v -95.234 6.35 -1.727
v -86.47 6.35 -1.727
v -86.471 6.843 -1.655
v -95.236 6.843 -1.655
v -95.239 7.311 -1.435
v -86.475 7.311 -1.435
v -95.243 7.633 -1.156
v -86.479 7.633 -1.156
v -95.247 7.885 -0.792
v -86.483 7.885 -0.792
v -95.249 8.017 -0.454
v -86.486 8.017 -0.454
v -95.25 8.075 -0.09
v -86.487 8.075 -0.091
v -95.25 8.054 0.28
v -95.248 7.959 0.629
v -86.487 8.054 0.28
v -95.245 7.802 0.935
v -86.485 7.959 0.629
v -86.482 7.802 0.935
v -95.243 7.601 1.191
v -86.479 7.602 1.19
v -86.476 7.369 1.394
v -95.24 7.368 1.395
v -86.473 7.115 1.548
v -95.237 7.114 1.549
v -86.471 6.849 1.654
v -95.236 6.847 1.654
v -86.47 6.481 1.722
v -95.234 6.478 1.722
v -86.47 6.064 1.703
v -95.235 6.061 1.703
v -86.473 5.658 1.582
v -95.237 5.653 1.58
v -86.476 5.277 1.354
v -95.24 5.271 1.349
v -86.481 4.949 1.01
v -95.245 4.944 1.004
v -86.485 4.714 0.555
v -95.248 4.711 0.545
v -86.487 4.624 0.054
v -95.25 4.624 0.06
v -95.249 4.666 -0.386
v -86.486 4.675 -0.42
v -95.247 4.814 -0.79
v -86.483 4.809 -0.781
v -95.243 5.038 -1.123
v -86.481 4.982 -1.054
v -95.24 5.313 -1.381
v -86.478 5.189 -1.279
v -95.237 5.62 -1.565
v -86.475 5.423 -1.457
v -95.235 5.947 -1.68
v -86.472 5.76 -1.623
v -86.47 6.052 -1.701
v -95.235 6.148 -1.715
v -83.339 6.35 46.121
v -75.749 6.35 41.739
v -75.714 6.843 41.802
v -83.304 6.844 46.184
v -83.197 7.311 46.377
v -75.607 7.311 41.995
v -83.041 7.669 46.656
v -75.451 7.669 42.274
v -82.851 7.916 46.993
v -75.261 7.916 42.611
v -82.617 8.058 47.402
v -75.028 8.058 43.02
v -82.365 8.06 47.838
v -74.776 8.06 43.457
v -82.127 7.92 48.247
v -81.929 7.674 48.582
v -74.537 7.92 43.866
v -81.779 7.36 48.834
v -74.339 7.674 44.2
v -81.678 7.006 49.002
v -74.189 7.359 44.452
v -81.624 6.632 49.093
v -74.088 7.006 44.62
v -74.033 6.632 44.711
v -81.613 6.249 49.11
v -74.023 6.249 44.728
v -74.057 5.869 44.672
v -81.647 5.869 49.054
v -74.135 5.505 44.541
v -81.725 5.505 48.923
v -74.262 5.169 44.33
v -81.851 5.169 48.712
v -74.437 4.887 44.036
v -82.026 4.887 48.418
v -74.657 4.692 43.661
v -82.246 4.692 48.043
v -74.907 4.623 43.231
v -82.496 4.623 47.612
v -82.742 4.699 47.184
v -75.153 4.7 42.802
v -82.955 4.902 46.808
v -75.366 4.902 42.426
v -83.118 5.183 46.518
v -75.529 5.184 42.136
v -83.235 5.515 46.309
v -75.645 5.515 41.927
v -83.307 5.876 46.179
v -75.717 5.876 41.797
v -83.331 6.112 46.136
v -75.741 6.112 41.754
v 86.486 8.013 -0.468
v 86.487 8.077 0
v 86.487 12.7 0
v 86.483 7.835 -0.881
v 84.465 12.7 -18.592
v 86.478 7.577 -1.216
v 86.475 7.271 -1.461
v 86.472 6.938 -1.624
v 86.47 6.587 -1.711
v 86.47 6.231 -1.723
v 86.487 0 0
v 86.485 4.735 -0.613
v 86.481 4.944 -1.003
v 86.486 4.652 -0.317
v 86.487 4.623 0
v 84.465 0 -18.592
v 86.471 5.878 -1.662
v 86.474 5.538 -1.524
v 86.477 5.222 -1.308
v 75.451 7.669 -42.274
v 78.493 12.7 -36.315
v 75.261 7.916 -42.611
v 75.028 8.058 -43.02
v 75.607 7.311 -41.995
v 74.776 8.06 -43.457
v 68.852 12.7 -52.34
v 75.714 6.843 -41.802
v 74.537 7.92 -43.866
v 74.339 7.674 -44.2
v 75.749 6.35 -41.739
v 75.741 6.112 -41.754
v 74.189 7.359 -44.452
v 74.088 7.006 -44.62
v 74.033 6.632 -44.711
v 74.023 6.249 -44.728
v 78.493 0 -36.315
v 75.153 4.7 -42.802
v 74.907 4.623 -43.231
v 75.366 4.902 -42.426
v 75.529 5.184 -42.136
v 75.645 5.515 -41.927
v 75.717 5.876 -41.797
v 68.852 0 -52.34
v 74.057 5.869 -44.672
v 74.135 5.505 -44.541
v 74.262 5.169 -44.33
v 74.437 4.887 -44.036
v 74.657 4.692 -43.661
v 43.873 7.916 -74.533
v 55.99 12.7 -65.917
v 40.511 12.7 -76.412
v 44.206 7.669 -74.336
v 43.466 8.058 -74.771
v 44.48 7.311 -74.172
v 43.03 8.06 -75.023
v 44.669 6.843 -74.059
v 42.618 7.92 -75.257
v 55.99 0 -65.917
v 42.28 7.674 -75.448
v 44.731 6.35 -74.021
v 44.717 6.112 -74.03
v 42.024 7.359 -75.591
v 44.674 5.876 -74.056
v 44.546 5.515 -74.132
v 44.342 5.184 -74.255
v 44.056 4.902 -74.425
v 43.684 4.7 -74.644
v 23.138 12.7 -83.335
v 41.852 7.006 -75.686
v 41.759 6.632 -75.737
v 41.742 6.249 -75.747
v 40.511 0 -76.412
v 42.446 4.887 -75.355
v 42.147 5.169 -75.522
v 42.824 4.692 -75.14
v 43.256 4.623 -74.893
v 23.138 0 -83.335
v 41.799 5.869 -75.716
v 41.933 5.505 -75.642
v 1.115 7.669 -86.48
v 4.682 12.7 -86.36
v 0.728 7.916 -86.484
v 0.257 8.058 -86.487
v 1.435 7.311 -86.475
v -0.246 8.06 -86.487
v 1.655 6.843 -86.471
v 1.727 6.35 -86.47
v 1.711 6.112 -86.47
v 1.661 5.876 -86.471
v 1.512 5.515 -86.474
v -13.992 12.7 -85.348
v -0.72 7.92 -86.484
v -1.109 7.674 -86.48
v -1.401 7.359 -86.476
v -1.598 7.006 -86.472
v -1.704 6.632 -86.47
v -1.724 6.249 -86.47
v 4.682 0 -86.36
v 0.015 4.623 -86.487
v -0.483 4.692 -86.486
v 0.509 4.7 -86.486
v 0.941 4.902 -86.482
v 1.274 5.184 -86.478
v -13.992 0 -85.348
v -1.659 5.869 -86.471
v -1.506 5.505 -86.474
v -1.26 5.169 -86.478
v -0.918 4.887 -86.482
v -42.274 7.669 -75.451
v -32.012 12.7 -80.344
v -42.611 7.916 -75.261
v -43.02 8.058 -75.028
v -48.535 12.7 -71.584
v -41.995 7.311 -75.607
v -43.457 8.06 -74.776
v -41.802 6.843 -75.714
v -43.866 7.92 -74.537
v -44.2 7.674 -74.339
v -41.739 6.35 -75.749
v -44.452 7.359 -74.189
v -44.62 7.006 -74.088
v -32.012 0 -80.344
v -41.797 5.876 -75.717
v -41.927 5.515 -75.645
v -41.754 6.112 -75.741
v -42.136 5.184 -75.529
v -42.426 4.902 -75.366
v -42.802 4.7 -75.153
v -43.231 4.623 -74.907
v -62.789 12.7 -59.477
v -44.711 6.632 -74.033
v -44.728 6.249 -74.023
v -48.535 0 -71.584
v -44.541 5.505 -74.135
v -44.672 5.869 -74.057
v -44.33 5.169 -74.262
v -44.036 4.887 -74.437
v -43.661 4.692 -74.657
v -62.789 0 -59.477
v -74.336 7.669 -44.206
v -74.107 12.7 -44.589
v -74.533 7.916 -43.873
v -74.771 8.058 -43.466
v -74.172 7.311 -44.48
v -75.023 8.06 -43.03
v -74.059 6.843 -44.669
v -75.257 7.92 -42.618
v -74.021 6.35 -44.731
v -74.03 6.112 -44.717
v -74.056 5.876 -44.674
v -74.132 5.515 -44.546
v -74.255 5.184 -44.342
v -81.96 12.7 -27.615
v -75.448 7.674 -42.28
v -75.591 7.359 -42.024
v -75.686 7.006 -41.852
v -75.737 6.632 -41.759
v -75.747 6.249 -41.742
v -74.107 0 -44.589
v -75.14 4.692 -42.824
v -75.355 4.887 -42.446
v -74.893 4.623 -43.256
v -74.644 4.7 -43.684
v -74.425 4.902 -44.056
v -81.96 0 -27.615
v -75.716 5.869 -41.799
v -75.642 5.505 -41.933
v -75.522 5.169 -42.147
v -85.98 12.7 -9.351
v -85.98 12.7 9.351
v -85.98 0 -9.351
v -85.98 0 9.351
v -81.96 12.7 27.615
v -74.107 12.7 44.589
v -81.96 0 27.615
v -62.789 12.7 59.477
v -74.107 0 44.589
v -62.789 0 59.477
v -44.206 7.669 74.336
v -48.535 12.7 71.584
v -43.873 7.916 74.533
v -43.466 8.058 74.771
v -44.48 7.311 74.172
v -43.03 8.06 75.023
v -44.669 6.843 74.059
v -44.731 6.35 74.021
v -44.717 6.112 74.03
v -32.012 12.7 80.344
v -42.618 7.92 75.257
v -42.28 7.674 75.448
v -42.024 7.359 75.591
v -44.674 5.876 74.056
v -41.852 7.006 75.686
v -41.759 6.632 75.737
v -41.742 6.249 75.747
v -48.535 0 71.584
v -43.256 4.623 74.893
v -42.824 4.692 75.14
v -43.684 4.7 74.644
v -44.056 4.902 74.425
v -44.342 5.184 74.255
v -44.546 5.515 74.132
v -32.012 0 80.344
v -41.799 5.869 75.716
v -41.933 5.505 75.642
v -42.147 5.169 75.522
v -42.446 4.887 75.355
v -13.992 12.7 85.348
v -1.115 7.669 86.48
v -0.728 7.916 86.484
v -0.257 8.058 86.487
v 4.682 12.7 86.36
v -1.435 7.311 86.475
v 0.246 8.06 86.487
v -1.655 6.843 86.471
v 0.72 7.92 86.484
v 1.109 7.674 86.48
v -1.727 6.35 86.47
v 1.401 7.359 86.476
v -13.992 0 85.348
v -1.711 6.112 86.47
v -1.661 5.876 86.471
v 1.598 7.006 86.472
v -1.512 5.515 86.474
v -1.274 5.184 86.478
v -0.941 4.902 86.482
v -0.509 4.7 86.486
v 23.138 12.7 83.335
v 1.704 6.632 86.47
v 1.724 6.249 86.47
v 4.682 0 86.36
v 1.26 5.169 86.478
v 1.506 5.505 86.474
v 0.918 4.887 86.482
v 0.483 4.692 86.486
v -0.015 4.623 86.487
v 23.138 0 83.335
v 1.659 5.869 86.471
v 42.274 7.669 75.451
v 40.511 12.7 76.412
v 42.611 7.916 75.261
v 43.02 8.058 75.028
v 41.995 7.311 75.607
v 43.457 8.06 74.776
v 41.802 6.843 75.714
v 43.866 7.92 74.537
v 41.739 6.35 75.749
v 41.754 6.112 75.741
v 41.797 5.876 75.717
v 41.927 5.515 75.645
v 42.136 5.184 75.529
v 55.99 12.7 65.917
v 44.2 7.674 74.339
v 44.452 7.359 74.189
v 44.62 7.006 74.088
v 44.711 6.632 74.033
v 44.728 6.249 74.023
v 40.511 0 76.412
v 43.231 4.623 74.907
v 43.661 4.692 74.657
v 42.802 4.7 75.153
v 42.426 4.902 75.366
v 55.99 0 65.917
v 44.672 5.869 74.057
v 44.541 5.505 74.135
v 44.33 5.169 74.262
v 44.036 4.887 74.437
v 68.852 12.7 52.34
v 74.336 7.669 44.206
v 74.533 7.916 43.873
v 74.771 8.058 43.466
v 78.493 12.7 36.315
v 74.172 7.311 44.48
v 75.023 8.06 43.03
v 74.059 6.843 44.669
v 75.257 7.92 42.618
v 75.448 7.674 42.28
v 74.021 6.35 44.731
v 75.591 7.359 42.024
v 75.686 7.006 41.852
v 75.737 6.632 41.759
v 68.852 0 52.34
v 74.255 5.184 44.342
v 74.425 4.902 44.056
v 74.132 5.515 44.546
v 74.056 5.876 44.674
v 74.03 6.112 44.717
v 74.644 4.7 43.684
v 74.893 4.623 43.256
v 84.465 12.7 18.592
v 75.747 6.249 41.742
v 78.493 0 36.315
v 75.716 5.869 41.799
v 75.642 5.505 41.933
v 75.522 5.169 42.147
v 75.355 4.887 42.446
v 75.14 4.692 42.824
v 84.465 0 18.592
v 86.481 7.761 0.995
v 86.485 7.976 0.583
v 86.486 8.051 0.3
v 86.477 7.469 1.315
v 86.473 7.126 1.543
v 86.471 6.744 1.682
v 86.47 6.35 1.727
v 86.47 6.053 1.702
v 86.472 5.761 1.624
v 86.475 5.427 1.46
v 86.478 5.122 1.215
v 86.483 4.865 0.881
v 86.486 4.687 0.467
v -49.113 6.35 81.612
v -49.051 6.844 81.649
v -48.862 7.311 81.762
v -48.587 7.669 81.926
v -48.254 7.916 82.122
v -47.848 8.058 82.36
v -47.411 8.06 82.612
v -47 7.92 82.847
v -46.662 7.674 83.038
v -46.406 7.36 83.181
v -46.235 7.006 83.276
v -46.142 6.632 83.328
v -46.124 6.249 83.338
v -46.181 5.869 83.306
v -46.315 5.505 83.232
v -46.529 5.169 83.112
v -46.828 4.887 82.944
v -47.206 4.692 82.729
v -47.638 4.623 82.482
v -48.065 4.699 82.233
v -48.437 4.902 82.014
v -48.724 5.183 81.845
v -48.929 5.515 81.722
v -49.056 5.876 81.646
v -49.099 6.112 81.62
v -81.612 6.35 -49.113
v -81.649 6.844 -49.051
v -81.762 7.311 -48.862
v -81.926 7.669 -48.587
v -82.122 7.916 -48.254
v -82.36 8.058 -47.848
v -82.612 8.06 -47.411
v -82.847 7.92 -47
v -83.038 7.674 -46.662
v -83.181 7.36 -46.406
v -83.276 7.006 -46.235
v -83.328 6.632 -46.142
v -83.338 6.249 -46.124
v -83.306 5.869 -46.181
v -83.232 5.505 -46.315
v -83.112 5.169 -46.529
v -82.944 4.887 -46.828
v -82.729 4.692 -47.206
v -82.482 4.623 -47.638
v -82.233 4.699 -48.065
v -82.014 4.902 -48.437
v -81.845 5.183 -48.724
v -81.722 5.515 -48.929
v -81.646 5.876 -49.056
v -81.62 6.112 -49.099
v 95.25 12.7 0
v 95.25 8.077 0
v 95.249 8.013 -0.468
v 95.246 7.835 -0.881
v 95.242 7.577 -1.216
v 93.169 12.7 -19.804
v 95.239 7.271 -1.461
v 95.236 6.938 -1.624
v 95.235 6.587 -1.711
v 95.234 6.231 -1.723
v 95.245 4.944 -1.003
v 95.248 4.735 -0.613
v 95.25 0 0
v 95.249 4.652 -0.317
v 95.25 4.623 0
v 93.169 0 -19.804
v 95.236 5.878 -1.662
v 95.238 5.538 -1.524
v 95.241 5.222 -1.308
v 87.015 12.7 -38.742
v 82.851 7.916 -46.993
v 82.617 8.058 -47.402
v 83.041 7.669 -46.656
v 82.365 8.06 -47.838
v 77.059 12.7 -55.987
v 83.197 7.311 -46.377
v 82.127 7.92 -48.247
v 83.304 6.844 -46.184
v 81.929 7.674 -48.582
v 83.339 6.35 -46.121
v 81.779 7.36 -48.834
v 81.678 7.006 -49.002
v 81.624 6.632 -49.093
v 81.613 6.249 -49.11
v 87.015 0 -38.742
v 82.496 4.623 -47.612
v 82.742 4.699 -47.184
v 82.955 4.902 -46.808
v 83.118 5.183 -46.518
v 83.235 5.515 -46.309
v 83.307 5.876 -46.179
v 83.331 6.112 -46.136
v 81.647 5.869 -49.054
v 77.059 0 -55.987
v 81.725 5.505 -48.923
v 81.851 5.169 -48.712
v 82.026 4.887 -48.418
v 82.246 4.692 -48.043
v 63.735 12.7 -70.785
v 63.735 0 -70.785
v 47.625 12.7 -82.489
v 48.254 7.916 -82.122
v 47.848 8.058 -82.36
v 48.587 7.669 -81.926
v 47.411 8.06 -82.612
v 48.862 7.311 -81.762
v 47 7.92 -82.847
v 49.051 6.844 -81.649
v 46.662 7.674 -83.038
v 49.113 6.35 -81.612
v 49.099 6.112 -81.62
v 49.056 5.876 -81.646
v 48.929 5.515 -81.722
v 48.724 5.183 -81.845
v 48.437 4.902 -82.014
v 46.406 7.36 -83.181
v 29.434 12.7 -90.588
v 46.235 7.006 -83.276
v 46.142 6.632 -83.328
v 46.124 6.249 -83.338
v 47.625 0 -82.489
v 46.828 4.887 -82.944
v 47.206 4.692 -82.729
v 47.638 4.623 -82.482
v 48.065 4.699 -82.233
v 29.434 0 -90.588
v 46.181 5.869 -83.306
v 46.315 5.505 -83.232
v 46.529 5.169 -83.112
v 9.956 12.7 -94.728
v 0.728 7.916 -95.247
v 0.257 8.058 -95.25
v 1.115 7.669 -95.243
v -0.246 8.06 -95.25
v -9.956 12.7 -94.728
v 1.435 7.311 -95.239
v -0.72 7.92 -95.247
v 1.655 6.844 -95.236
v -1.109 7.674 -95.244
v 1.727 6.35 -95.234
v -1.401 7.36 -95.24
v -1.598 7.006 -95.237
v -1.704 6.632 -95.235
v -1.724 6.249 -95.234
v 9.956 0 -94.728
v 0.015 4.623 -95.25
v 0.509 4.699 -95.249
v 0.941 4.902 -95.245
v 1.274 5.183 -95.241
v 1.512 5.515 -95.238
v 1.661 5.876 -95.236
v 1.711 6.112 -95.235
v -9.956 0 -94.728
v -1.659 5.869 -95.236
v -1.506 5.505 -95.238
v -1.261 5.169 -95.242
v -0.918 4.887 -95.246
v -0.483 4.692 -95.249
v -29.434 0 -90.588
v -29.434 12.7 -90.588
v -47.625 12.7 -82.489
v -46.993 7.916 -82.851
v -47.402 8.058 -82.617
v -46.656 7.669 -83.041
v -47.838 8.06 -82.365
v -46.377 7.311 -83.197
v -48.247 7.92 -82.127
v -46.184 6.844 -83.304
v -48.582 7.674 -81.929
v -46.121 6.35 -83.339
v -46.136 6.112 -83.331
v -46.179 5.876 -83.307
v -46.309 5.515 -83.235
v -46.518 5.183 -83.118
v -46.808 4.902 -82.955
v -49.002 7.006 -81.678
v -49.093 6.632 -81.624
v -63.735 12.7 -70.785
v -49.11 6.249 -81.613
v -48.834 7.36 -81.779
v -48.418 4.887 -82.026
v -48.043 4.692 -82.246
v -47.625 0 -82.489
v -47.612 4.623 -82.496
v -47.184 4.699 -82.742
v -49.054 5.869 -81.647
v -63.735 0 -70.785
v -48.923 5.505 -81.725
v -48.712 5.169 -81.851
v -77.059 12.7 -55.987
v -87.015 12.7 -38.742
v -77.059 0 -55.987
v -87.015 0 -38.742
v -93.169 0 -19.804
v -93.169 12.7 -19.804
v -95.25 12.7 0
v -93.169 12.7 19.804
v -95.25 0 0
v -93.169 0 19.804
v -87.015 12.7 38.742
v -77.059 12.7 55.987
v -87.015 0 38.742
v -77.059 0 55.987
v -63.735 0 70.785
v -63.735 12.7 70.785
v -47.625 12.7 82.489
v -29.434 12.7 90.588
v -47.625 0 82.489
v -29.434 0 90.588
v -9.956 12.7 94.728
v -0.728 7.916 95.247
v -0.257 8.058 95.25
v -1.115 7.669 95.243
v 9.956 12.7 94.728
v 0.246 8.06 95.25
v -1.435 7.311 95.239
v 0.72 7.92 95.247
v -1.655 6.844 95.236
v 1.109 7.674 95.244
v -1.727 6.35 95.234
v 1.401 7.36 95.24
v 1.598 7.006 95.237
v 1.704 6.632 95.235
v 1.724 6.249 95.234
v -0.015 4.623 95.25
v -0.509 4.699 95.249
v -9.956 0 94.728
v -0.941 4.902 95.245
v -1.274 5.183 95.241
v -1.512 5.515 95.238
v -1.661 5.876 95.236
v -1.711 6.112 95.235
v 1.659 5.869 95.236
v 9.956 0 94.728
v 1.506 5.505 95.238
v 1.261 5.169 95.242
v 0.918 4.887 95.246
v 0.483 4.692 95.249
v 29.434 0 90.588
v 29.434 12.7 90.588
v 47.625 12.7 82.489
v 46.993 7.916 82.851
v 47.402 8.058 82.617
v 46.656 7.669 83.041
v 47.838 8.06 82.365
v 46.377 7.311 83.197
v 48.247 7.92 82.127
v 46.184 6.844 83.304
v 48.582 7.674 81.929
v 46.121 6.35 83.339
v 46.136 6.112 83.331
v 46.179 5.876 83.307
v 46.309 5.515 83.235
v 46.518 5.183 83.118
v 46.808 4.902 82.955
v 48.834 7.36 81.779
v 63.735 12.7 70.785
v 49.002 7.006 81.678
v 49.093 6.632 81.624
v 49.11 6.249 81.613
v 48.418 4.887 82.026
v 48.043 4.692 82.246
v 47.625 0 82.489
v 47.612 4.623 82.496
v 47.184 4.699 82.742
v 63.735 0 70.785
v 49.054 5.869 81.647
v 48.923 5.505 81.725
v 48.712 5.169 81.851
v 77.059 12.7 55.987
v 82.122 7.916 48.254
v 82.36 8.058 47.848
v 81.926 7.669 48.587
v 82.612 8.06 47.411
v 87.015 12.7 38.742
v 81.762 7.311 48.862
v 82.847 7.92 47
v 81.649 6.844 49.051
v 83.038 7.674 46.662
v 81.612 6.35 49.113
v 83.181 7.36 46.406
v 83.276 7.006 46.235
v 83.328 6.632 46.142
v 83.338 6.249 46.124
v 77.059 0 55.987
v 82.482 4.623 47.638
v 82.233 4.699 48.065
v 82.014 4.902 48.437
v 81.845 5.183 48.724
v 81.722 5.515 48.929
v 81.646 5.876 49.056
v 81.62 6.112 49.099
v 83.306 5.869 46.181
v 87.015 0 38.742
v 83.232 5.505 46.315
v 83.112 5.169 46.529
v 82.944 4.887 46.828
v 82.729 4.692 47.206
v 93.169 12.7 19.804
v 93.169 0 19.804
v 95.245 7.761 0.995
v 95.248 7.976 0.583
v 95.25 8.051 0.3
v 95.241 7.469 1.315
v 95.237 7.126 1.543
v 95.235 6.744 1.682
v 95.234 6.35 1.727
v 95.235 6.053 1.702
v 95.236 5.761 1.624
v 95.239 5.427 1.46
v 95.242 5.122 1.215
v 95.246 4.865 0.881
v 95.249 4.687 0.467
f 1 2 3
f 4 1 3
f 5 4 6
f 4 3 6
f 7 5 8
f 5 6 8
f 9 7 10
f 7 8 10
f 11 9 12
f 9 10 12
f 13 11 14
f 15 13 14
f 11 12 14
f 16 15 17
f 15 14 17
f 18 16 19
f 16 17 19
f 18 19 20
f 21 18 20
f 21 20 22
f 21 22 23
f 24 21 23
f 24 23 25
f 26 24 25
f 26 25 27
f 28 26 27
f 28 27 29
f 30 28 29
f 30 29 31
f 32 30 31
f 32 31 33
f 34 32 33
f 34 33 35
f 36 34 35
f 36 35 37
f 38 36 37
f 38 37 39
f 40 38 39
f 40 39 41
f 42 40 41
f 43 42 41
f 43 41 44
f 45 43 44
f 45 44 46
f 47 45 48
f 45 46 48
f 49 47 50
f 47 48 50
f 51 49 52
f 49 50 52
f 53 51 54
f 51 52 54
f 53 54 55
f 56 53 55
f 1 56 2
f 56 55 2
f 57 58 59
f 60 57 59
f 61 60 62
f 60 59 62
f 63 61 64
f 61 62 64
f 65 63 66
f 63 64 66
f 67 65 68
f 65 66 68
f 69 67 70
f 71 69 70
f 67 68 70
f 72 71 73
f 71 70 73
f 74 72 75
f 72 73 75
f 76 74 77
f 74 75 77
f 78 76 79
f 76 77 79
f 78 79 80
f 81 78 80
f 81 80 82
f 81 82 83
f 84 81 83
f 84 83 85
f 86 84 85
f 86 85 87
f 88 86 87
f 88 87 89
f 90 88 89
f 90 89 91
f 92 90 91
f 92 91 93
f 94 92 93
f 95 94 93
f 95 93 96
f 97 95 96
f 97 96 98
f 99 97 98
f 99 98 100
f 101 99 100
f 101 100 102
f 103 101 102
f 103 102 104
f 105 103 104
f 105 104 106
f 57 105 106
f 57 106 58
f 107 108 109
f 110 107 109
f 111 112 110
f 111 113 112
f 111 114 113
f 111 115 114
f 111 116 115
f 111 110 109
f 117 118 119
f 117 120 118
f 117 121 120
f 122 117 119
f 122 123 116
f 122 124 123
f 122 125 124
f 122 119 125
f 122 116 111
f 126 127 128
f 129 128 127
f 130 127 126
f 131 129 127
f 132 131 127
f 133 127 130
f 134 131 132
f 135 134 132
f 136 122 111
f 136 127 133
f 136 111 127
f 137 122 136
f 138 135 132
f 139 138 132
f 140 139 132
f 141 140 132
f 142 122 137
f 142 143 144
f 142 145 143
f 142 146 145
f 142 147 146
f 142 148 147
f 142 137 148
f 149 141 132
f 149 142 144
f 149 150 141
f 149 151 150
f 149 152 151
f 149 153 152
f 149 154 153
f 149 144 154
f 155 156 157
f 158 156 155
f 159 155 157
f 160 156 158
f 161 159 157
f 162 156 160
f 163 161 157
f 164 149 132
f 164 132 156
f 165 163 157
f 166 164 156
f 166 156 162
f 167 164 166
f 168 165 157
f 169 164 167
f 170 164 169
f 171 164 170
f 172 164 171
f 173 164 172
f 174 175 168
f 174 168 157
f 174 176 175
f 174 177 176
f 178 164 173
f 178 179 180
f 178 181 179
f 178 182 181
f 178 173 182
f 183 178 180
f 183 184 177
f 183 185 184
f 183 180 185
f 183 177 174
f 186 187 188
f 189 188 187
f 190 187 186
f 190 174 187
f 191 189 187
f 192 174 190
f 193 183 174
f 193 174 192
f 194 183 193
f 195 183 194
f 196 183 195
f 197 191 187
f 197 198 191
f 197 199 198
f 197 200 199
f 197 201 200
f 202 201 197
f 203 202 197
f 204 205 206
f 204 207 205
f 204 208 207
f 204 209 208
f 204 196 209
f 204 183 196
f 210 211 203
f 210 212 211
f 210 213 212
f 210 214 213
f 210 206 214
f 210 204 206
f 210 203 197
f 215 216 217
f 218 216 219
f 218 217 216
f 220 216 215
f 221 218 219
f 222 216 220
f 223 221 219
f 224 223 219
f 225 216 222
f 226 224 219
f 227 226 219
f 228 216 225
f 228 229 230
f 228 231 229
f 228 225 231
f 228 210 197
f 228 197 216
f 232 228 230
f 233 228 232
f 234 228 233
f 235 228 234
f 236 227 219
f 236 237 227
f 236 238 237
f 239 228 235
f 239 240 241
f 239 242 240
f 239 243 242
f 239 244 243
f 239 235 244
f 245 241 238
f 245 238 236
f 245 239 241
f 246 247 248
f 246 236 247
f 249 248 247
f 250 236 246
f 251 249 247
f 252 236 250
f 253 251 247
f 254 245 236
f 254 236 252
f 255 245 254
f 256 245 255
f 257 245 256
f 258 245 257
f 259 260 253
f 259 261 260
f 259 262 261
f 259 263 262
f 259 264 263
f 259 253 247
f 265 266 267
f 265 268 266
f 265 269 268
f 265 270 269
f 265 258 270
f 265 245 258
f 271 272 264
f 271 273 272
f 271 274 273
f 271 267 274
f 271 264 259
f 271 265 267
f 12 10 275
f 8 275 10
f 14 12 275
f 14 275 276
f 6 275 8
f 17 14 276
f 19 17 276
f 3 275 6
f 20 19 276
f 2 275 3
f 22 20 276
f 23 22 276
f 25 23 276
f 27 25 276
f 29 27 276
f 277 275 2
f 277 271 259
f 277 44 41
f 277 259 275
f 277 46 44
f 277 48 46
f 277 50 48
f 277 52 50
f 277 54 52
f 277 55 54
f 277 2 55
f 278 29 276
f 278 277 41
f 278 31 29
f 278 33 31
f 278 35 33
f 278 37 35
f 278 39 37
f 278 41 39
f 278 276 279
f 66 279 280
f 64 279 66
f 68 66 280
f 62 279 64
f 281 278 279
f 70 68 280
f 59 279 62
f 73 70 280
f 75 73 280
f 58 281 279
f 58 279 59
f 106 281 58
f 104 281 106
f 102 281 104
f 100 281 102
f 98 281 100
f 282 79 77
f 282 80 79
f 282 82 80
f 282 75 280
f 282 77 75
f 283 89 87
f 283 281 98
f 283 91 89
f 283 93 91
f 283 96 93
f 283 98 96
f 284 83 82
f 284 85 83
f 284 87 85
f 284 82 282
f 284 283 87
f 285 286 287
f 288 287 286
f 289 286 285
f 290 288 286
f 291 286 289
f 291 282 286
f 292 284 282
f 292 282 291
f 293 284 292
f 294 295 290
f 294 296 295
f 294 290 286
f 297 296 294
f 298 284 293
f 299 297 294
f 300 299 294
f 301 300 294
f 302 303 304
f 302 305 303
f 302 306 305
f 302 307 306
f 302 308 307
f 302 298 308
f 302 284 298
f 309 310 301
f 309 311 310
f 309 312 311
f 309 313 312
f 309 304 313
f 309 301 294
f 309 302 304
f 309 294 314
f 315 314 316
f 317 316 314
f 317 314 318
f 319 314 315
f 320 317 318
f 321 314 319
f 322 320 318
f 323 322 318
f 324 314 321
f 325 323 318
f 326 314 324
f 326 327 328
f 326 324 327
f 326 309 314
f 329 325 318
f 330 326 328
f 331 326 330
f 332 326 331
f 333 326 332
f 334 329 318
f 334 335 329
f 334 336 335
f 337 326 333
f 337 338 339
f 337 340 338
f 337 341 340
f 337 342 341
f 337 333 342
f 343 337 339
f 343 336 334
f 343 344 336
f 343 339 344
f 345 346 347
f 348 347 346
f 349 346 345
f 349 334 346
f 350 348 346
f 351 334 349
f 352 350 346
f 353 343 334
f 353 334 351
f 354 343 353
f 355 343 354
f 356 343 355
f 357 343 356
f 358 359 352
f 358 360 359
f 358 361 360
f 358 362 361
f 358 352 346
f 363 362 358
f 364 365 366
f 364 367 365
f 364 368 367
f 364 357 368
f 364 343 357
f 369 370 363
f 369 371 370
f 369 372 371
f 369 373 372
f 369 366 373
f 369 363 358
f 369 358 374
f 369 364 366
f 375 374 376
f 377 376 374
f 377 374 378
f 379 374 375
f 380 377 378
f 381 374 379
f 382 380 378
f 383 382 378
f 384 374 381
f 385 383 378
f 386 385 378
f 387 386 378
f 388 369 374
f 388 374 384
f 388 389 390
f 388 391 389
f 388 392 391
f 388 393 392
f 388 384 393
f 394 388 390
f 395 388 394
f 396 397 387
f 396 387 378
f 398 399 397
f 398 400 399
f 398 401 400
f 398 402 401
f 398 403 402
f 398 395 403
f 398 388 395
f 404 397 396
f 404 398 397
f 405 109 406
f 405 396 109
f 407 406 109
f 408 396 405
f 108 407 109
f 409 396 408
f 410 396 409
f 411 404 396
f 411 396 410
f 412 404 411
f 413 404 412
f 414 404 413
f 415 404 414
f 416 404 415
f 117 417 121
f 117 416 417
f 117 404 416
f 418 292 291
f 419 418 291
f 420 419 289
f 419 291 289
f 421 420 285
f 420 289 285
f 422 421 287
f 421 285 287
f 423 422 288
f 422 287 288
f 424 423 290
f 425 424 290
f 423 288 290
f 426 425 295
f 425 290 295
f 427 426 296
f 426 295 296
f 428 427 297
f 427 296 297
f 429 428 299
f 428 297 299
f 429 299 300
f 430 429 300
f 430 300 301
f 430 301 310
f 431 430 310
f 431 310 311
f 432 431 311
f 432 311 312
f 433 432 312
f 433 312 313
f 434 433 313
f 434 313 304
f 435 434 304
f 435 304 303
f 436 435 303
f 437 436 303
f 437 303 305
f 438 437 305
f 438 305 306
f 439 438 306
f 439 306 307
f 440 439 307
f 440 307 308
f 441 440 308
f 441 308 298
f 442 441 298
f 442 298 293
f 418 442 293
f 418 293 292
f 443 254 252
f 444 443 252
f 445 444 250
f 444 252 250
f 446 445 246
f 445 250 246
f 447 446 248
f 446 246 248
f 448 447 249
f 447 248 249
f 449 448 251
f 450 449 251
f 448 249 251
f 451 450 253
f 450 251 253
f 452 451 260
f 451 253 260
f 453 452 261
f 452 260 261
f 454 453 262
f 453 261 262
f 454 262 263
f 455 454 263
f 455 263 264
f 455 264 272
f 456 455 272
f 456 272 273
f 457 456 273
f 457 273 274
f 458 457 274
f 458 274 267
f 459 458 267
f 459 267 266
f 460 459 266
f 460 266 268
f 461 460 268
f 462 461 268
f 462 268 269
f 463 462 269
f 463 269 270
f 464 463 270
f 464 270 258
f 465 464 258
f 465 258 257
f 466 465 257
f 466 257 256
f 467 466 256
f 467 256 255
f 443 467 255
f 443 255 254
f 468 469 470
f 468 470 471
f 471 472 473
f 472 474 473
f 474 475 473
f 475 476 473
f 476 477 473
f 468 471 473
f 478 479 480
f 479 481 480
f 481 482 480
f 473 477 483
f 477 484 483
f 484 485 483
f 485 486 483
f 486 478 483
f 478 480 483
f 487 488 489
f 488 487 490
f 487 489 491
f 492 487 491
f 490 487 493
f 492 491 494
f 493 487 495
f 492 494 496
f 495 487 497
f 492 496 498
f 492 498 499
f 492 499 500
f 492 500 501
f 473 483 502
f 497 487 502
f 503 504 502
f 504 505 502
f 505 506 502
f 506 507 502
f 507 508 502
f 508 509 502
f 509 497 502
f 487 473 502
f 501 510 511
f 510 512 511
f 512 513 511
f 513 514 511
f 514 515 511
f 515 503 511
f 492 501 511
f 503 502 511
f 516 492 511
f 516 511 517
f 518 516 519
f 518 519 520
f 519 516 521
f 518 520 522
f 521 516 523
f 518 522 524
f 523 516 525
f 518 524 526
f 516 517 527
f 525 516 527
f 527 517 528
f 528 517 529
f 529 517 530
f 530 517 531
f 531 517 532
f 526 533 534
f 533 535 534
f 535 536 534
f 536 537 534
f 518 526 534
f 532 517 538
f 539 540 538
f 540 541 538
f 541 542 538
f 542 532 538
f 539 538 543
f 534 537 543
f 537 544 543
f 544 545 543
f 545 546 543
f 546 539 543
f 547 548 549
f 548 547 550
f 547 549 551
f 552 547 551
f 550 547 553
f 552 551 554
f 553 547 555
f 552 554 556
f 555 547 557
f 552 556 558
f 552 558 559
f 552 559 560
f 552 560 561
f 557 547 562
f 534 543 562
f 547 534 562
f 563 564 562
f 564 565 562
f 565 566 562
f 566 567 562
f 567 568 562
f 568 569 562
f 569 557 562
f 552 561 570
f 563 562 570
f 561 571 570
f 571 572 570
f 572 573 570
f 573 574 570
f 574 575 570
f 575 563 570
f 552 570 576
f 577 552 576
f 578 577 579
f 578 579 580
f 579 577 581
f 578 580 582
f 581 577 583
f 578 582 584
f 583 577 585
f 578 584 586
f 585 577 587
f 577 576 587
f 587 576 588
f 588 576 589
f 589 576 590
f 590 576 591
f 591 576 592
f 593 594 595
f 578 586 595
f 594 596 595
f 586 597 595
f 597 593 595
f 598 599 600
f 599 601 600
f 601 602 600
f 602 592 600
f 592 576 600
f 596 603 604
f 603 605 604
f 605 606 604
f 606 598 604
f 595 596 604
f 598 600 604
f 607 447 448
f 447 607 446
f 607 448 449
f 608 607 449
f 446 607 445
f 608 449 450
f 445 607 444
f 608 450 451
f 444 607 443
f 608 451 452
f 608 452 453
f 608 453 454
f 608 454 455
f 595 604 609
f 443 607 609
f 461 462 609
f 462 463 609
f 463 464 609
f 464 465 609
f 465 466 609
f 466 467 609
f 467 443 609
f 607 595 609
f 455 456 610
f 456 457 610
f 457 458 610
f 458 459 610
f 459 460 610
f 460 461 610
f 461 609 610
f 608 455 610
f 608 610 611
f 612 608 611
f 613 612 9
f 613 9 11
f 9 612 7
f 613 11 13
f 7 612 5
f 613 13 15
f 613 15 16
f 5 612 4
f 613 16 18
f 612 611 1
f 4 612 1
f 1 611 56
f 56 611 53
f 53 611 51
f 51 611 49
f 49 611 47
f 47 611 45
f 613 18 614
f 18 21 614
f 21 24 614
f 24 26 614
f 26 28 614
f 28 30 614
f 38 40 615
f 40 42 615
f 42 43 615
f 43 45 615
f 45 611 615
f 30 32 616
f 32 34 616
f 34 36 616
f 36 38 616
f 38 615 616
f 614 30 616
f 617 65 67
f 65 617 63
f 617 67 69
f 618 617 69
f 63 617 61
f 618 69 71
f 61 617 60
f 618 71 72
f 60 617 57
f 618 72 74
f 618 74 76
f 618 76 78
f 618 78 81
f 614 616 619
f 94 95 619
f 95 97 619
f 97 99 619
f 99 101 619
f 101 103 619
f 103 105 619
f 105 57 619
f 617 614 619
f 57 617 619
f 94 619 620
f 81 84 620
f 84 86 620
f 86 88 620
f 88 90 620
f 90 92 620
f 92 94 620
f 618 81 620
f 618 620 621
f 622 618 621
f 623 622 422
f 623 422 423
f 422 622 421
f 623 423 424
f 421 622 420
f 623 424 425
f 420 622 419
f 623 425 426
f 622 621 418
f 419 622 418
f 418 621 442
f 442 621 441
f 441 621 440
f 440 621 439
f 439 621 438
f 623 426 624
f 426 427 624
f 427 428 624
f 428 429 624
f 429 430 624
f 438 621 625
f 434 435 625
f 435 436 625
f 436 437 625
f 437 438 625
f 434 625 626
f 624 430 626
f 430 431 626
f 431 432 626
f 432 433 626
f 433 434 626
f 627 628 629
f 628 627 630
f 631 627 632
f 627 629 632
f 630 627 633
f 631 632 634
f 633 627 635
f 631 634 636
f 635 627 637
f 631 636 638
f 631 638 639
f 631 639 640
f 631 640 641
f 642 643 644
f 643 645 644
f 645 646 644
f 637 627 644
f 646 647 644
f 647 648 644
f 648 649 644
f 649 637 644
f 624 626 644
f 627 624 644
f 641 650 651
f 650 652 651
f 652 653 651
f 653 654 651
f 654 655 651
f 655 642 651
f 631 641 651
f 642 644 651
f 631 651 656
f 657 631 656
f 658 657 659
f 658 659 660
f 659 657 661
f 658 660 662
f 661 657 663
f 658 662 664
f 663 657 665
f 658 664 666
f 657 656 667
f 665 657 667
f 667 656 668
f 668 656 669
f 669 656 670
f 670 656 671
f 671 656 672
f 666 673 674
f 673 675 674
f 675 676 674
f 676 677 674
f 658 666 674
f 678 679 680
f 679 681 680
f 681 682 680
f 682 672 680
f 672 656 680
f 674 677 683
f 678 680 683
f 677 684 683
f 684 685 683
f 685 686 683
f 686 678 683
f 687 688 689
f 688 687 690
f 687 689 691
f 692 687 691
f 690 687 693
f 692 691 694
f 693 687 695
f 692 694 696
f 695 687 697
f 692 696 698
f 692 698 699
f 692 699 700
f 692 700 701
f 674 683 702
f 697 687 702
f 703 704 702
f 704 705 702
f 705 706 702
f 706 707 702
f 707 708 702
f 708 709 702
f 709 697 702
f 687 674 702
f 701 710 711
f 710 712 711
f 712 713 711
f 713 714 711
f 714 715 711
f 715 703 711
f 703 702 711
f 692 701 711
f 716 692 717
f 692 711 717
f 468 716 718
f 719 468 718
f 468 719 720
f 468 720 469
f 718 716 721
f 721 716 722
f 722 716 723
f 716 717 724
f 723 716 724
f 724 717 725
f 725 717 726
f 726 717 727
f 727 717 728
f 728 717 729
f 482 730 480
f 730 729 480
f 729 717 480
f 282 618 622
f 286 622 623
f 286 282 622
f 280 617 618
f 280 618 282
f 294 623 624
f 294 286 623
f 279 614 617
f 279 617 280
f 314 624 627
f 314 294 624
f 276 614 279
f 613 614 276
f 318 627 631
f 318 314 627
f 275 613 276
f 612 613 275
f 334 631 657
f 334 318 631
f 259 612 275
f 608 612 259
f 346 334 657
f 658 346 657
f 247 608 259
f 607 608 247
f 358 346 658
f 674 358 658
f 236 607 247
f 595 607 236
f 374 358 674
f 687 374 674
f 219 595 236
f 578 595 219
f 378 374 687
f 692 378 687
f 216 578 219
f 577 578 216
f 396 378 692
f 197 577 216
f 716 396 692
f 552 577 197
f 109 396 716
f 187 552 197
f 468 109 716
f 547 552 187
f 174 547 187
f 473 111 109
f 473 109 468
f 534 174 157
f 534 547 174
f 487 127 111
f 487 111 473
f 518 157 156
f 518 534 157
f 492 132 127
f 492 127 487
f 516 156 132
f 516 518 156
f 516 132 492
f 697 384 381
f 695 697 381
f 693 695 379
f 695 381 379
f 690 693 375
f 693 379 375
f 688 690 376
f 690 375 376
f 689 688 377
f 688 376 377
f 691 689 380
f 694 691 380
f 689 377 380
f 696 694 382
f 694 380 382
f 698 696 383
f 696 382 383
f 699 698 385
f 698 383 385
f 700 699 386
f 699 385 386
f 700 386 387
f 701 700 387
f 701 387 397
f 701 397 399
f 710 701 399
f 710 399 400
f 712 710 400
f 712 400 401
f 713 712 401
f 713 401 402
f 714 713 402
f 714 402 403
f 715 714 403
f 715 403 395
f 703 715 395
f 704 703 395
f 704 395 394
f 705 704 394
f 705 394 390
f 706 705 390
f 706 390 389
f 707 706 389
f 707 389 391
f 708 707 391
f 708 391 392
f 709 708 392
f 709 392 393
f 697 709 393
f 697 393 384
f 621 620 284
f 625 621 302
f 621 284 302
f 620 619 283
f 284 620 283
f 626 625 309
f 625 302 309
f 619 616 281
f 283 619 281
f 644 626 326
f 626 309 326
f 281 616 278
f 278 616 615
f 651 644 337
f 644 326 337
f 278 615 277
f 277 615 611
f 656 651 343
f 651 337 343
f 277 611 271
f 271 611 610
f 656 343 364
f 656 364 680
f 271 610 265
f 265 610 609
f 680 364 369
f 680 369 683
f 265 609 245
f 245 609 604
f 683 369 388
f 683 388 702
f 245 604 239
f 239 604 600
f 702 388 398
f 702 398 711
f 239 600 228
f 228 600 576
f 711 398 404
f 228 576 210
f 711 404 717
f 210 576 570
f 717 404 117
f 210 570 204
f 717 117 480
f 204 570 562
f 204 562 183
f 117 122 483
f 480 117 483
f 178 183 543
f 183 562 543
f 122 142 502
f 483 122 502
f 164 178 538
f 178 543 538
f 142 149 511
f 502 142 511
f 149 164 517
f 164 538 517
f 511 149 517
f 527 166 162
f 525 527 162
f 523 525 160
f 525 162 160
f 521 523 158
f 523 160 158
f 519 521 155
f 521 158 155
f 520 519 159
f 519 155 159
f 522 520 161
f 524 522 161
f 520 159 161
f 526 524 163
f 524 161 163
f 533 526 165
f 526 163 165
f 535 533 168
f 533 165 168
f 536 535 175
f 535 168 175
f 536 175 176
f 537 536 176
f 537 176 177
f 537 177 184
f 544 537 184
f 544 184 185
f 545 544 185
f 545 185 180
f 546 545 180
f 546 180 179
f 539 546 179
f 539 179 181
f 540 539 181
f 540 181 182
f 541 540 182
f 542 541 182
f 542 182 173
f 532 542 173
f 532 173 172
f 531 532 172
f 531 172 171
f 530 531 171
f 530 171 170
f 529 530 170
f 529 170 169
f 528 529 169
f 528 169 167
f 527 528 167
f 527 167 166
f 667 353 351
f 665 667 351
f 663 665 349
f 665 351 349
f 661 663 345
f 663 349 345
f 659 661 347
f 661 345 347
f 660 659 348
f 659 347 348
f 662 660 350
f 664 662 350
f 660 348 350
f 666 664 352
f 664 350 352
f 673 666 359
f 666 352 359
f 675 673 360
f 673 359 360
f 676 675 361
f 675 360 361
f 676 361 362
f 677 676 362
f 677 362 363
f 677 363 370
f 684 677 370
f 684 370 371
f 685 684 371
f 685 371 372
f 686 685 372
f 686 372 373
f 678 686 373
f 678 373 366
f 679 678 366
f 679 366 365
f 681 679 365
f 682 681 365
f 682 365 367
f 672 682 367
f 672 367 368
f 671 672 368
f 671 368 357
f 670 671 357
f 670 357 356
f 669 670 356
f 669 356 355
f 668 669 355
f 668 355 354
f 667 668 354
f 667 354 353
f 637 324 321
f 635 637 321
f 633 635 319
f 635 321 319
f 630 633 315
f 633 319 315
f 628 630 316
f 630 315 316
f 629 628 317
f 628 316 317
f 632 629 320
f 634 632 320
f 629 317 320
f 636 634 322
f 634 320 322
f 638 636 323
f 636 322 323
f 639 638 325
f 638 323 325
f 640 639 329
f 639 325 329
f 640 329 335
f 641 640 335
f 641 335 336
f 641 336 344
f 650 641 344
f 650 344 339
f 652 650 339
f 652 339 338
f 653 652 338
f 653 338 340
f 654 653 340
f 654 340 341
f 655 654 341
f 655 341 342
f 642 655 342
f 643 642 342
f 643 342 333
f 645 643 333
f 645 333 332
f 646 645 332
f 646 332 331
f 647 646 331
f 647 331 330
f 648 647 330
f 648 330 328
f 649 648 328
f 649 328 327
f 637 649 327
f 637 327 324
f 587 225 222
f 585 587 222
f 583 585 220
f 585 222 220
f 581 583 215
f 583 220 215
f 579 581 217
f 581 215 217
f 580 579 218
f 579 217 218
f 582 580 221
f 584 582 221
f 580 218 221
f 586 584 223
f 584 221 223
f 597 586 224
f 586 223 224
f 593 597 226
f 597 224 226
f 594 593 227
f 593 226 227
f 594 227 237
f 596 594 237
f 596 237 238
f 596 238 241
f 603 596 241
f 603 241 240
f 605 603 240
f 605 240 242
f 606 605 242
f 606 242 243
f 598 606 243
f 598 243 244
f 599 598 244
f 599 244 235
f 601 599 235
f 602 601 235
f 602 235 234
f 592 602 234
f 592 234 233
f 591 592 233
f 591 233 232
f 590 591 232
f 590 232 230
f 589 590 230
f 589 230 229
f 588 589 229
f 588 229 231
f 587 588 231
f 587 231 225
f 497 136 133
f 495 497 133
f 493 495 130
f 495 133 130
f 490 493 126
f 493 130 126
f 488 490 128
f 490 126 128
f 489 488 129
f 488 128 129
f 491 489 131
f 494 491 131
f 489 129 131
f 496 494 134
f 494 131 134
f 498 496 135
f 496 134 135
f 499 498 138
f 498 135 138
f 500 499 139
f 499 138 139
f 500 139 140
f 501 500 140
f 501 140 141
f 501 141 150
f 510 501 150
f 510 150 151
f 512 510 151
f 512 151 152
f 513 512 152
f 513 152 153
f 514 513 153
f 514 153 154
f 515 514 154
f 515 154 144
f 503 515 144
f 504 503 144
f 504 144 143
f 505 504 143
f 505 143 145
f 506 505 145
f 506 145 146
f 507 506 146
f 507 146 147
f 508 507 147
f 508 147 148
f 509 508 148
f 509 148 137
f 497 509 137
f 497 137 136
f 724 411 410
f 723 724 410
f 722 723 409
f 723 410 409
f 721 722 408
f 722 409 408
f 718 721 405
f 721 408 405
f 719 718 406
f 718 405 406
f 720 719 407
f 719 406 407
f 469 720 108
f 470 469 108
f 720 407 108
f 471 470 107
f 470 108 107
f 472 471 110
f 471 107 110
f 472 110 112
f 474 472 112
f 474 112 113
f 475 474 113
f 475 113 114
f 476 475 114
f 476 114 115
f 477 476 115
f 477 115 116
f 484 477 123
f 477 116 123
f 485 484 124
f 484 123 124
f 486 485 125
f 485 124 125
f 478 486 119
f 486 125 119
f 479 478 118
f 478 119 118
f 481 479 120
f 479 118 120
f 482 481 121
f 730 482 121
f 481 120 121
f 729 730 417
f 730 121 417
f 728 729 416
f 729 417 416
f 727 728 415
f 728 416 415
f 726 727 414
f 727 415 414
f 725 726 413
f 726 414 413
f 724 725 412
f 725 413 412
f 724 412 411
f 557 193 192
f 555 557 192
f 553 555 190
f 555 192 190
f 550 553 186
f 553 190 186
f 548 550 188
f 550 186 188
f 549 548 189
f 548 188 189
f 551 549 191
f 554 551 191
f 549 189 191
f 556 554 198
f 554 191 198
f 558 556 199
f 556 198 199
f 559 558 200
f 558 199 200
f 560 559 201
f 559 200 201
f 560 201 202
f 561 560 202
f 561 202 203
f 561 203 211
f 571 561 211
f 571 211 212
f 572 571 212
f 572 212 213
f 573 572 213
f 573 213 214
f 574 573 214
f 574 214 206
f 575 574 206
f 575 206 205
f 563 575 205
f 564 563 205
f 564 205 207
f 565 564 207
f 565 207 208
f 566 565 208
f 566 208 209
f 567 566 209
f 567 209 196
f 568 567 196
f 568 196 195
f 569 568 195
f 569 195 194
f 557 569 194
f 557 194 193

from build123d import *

# Parameters (mm, degrees)
SKETCH1_R           = 95.25
SKETCH1_R_2         = 86.487
BOSS_EXTRUDE1_DEPTH = 12.7
SKETCH3_R           = 1.7272
CUT_EXTRUDE2_DEPTH  = 254
CIRPATTERN1_COUNT   = 12


with BuildPart() as part:
    # Sketch1 → Boss-Extrude1 (new body)
    with BuildSketch(Plane(origin=(0, 0, 0), x_dir=(1, 0, 0), z_dir=(0, 1, 0))):
        Circle(SKETCH1_R)
        Circle(SKETCH1_R_2, mode=Mode.SUBTRACT)
    extrude(amount=BOSS_EXTRUDE1_DEPTH)

    # Sketch3 → Cut-Extrude2 (cut)
    with BuildSketch(Plane.XY):
        with Locations((0, 6.35)):
            Circle(SKETCH3_R)
    cut_extrude2 = extrude(amount=-CUT_EXTRUDE2_DEPTH, mode=Mode.SUBTRACT)

    # CirPattern1: Cut-Extrude2 ×12 about axis
    cirpattern1_axis = Axis((0, 12.7, 0), (0, 1, 0))
    for i in range(1, CIRPATTERN1_COUNT):
        add(cut_extrude2.rotate(cirpattern1_axis, i * 360 / CIRPATTERN1_COUNT), mode=Mode.SUBTRACT)


solid = part.part
